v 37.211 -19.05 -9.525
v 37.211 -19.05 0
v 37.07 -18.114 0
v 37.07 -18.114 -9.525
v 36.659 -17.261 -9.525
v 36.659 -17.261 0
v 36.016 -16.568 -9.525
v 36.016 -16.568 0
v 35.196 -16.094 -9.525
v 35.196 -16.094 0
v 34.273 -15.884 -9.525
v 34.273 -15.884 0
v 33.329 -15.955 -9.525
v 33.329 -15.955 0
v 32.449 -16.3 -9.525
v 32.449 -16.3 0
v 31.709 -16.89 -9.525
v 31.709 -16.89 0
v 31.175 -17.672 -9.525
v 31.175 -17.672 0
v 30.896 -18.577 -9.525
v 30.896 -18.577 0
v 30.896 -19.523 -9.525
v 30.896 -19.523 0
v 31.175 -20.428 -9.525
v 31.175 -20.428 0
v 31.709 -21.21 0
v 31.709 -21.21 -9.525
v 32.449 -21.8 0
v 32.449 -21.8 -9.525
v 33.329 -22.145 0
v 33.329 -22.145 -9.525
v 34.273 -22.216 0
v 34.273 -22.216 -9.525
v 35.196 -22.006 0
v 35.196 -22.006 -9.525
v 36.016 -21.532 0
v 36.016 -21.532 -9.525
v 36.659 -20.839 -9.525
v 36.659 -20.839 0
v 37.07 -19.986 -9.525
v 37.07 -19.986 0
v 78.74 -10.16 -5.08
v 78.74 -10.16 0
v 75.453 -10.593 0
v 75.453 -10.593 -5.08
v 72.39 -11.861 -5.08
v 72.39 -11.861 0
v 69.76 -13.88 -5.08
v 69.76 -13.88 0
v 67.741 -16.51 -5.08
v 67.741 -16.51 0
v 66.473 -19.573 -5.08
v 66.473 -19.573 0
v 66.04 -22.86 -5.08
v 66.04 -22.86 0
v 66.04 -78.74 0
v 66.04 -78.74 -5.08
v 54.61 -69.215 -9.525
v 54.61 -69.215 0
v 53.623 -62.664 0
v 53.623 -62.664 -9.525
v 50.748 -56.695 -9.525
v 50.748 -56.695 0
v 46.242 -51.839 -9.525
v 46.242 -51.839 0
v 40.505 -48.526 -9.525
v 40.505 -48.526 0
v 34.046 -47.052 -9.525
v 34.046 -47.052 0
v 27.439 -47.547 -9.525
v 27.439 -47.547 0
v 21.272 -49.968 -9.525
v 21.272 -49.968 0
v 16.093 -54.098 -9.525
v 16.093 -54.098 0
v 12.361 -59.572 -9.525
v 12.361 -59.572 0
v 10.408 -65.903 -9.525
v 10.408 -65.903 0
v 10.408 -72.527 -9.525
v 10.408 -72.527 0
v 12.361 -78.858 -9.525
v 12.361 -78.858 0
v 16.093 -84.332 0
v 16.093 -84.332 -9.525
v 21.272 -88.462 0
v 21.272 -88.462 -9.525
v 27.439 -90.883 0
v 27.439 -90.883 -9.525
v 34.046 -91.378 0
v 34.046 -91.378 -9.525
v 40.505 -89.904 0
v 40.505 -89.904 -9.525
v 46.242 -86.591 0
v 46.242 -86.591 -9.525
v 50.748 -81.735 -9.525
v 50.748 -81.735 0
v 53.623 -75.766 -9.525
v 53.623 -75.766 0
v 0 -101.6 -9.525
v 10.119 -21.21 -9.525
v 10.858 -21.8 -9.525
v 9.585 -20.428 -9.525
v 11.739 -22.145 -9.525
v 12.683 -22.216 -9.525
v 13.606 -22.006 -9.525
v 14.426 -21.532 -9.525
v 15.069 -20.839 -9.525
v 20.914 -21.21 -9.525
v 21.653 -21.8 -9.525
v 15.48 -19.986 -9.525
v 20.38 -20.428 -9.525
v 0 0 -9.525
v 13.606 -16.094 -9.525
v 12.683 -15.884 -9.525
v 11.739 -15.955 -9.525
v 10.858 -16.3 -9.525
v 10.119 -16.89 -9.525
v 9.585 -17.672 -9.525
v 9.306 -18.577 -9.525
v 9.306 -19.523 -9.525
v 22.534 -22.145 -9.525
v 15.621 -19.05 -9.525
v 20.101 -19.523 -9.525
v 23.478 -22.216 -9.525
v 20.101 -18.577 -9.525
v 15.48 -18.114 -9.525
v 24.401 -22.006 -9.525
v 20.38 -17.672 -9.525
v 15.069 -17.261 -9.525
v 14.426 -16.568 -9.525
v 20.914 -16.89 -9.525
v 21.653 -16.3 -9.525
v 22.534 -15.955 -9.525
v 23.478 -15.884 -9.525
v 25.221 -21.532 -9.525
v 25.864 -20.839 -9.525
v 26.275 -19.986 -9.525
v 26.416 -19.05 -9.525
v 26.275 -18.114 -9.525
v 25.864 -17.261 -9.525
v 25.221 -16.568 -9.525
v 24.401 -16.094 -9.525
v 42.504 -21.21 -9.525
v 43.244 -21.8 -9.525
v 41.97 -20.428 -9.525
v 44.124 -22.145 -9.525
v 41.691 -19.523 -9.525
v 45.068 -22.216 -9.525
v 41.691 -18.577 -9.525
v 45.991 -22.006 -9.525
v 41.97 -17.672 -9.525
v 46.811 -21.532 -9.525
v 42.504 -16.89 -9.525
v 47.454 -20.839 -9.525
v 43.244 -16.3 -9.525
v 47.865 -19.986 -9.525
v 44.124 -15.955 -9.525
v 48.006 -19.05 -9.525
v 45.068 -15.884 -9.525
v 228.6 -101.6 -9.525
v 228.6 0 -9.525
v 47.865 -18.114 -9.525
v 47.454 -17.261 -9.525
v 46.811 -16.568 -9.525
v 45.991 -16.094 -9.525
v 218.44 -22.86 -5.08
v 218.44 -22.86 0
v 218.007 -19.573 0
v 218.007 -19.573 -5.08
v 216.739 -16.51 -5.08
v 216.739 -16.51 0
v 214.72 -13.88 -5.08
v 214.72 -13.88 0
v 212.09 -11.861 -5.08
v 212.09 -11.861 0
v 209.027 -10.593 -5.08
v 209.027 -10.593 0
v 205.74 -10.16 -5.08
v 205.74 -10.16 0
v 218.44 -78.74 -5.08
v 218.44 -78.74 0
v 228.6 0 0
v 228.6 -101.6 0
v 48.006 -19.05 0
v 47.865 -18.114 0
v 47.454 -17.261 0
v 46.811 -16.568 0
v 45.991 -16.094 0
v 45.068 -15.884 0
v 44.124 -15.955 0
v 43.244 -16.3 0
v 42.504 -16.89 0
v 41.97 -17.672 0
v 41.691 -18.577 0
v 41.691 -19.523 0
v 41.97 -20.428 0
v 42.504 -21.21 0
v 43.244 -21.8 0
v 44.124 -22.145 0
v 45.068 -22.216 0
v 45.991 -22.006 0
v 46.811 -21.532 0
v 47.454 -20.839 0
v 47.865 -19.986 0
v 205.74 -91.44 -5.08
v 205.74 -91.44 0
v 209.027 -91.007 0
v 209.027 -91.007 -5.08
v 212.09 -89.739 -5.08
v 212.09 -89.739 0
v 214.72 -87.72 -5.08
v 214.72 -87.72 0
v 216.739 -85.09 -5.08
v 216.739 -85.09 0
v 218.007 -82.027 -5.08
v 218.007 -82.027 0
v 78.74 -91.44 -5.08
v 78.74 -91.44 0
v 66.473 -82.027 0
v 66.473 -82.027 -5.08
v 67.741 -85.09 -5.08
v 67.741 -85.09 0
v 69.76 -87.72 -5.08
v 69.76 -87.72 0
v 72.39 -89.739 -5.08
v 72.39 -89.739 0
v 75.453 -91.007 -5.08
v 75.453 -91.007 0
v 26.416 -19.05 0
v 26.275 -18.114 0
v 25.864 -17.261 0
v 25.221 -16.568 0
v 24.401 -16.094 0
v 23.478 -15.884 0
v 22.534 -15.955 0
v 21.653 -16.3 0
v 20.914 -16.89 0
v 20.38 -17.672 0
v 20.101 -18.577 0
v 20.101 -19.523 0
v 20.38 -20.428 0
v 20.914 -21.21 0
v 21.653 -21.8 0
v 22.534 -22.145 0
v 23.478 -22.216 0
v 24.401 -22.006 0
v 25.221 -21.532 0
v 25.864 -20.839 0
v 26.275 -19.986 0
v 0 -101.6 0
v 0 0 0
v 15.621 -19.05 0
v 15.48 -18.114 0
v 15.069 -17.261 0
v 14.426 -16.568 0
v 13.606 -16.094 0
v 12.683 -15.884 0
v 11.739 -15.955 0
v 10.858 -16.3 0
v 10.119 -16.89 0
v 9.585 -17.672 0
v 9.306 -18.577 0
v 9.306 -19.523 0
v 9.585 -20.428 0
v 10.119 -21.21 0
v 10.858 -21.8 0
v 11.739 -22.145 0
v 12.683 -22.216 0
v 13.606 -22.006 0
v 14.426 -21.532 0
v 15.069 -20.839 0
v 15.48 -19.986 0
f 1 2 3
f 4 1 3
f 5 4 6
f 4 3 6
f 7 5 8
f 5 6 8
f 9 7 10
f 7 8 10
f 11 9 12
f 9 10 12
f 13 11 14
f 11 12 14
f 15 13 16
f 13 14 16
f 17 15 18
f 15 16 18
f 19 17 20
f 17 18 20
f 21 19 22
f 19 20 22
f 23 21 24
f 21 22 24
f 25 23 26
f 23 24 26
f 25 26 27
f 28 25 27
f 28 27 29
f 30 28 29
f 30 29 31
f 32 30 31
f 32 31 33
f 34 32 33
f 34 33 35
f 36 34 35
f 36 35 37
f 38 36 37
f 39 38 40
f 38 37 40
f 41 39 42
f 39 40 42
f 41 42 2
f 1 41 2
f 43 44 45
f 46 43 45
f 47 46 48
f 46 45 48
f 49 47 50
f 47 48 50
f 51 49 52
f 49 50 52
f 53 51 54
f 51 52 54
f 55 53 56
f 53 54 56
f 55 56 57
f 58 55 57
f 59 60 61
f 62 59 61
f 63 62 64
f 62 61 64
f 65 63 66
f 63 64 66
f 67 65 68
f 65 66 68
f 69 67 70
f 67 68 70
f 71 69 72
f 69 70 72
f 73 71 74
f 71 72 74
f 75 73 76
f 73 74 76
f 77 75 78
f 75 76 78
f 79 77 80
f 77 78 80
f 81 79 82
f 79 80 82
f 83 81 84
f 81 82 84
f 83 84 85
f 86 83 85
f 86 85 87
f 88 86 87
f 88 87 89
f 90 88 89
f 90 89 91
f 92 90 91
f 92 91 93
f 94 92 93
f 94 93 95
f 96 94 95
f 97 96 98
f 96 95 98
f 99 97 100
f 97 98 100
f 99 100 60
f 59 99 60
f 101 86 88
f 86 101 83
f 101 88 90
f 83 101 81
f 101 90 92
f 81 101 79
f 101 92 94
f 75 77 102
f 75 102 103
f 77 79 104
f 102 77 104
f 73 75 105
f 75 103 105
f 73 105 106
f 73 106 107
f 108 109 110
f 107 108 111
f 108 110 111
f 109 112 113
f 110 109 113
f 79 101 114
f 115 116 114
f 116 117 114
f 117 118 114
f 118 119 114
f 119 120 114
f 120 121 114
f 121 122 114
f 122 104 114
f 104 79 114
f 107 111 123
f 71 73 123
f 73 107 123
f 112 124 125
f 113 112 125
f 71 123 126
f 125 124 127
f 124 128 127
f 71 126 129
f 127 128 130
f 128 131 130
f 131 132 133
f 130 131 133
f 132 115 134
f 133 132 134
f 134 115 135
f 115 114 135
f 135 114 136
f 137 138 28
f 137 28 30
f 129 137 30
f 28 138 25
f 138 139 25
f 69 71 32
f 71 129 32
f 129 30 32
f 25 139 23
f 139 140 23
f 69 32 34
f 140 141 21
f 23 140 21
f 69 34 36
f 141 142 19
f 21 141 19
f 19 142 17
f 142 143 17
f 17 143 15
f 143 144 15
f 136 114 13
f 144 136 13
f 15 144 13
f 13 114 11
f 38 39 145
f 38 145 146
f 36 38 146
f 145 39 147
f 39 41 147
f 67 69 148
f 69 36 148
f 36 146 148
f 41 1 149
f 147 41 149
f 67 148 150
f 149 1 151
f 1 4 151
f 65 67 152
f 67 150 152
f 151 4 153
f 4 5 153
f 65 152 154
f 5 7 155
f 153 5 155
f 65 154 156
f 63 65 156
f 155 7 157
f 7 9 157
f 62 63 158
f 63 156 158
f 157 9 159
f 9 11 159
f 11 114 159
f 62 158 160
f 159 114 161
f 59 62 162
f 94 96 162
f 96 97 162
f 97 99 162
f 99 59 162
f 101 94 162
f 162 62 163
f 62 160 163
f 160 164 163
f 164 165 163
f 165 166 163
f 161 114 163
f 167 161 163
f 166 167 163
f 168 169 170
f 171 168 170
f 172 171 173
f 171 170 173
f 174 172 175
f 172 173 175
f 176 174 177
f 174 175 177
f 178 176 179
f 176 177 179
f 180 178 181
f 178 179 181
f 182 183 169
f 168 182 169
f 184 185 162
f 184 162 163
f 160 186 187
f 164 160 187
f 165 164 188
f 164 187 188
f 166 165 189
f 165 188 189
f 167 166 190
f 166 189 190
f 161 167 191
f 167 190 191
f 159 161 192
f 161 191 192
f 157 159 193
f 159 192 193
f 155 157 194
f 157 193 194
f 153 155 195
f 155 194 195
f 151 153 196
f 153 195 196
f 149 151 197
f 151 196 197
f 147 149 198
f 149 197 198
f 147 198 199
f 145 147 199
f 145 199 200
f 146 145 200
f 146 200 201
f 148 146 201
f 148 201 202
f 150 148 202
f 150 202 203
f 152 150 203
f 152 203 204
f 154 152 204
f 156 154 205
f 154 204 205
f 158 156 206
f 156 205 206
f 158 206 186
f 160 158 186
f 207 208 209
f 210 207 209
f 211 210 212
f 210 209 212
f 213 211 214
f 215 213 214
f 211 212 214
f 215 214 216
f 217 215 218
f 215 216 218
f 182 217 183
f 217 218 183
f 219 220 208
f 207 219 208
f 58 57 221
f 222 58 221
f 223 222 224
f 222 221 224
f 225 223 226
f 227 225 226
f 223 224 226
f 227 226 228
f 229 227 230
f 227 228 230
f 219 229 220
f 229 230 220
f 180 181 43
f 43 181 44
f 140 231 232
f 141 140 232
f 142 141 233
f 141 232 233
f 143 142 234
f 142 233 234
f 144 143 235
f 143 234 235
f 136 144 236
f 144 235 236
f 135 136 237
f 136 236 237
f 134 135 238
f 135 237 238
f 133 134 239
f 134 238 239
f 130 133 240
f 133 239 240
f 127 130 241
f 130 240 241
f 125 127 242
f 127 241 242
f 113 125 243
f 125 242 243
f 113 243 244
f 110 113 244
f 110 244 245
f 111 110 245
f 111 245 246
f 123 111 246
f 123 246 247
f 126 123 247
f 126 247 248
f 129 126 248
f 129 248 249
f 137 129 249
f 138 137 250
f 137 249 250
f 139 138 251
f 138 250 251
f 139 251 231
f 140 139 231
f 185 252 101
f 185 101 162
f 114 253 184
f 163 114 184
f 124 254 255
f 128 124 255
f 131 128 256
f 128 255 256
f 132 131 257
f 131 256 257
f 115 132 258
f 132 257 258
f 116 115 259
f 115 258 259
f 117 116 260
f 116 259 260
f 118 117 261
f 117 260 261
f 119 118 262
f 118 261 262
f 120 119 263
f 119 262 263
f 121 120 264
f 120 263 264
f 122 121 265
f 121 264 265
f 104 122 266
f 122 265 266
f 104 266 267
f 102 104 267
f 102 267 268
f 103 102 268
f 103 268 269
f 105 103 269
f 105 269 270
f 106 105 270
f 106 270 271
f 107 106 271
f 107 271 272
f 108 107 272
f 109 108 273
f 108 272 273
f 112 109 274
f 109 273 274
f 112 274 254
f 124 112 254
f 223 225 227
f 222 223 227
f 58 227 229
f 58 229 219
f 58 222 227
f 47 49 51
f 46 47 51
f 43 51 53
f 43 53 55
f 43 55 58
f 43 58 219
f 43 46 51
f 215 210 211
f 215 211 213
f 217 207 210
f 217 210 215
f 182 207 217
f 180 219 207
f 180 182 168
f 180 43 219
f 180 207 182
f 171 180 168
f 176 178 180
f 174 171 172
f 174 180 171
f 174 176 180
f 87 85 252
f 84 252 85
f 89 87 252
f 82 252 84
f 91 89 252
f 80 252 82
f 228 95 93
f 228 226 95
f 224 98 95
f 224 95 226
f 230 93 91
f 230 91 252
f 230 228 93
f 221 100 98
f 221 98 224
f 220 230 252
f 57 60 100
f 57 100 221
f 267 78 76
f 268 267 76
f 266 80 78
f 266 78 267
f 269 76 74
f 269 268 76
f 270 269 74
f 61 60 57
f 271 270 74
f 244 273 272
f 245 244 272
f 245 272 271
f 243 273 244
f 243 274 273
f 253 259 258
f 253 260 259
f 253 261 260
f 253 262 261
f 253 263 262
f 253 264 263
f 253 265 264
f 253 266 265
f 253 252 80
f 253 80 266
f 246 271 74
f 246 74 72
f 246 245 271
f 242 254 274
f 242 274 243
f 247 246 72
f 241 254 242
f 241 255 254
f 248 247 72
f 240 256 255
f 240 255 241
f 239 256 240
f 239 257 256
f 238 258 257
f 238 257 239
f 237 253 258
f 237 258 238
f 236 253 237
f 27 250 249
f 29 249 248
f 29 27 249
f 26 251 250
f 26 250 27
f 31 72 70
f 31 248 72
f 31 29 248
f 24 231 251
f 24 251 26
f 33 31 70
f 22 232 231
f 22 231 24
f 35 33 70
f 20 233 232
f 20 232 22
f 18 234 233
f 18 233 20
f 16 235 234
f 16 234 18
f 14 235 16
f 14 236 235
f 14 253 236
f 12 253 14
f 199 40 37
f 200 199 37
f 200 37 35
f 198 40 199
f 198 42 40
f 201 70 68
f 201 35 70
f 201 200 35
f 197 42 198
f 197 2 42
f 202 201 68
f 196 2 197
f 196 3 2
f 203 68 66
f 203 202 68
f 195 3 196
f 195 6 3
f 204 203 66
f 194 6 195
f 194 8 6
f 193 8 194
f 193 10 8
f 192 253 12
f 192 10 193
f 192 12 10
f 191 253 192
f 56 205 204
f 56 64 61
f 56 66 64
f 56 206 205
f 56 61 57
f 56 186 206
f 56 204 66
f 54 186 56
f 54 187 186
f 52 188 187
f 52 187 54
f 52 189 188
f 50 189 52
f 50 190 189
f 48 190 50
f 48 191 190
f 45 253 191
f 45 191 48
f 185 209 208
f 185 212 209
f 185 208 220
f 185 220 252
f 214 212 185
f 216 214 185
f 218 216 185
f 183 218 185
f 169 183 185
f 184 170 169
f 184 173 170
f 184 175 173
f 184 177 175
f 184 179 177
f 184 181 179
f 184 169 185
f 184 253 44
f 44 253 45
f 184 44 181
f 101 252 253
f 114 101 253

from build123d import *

# Parameters (mm, degrees)
F0_W     = 228.6
F0_H     = 101.6
F0_R     = 22.225
F0_R_2   = 3.175
F1_DEPTH = 9.525
F2_DEPTH = 5.08


with BuildPart() as f1:
    # F0 (on Top) → F1 (new body)
    with BuildSketch(Plane.XY):
        with Locations((114.3, -50.8)):
            Rectangle(F0_W, F0_H)
        with Locations((32.385, -69.215)):
            Circle(F0_R, mode=Mode.SUBTRACT)
        with Locations((12.446, -19.05)):
            Circle(F0_R_2, mode=Mode.SUBTRACT)
        with Locations((23.241, -19.05)):
            Circle(F0_R_2, mode=Mode.SUBTRACT)
        with Locations((34.036, -19.05)):
            Circle(F0_R_2, mode=Mode.SUBTRACT)
        with Locations((44.831, -19.05)):
            Circle(F0_R_2, mode=Mode.SUBTRACT)
        with BuildLine():
            ThreePointArc((66.04, -22.86), (69.759744, -13.879744), (78.74, -10.16))
            Line((78.74, -10.16), (205.74, -10.16))
            ThreePointArc((205.74, -10.16), (214.720256, -13.879744), (218.44, -22.86))
            Line((218.44, -22.86), (218.44, -78.74))
            ThreePointArc((218.44, -78.74), (214.720256, -87.720256), (205.74, -91.44))
            Line((205.74, -91.44), (78.74, -91.44))
            ThreePointArc((78.74, -91.44), (69.759744, -87.720256), (66.04, -78.74))
            Line((66.04, -78.74), (66.04, -22.86))
        make_face(mode=Mode.SUBTRACT)
        with BuildLine():
            Line((205.74, -10.16), (78.74, -10.16))
            ThreePointArc((78.74, -10.16), (69.759744, -13.879744), (66.04, -22.86))
            Line((66.04, -22.86), (66.04, -78.74))
            ThreePointArc((66.04, -78.74), (69.759744, -87.720256), (78.74, -91.44))
            Line((78.74, -91.44), (205.74, -91.44))
            ThreePointArc((205.74, -91.44), (214.720256, -87.720256), (218.44, -78.74))
            Line((218.44, -78.74), (218.44, -22.86))
            ThreePointArc((218.44, -22.86), (214.720256, -13.879744), (205.74, -10.16))
        make_face()
    extrude(amount=-F1_DEPTH)

    # F0 (on Top) → F2 (cut)
    with BuildSketch(Plane.XY):
        with BuildLine():
            Line((205.74, -10.16), (78.74, -10.16))
            ThreePointArc((78.74, -10.16), (69.759744, -13.879744), (66.04, -22.86))
            Line((66.04, -22.86), (66.04, -78.74))
            ThreePointArc((66.04, -78.74), (69.759744, -87.720256), (78.74, -91.44))
            Line((78.74, -91.44), (205.74, -91.44))
            ThreePointArc((205.74, -91.44), (214.720256, -87.720256), (218.44, -78.74))
            Line((218.44, -78.74), (218.44, -22.86))
            ThreePointArc((218.44, -22.86), (214.720256, -13.879744), (205.74, -10.16))
        make_face()
    extrude(amount=-F2_DEPTH, mode=Mode.SUBTRACT)


solid = f1.part
